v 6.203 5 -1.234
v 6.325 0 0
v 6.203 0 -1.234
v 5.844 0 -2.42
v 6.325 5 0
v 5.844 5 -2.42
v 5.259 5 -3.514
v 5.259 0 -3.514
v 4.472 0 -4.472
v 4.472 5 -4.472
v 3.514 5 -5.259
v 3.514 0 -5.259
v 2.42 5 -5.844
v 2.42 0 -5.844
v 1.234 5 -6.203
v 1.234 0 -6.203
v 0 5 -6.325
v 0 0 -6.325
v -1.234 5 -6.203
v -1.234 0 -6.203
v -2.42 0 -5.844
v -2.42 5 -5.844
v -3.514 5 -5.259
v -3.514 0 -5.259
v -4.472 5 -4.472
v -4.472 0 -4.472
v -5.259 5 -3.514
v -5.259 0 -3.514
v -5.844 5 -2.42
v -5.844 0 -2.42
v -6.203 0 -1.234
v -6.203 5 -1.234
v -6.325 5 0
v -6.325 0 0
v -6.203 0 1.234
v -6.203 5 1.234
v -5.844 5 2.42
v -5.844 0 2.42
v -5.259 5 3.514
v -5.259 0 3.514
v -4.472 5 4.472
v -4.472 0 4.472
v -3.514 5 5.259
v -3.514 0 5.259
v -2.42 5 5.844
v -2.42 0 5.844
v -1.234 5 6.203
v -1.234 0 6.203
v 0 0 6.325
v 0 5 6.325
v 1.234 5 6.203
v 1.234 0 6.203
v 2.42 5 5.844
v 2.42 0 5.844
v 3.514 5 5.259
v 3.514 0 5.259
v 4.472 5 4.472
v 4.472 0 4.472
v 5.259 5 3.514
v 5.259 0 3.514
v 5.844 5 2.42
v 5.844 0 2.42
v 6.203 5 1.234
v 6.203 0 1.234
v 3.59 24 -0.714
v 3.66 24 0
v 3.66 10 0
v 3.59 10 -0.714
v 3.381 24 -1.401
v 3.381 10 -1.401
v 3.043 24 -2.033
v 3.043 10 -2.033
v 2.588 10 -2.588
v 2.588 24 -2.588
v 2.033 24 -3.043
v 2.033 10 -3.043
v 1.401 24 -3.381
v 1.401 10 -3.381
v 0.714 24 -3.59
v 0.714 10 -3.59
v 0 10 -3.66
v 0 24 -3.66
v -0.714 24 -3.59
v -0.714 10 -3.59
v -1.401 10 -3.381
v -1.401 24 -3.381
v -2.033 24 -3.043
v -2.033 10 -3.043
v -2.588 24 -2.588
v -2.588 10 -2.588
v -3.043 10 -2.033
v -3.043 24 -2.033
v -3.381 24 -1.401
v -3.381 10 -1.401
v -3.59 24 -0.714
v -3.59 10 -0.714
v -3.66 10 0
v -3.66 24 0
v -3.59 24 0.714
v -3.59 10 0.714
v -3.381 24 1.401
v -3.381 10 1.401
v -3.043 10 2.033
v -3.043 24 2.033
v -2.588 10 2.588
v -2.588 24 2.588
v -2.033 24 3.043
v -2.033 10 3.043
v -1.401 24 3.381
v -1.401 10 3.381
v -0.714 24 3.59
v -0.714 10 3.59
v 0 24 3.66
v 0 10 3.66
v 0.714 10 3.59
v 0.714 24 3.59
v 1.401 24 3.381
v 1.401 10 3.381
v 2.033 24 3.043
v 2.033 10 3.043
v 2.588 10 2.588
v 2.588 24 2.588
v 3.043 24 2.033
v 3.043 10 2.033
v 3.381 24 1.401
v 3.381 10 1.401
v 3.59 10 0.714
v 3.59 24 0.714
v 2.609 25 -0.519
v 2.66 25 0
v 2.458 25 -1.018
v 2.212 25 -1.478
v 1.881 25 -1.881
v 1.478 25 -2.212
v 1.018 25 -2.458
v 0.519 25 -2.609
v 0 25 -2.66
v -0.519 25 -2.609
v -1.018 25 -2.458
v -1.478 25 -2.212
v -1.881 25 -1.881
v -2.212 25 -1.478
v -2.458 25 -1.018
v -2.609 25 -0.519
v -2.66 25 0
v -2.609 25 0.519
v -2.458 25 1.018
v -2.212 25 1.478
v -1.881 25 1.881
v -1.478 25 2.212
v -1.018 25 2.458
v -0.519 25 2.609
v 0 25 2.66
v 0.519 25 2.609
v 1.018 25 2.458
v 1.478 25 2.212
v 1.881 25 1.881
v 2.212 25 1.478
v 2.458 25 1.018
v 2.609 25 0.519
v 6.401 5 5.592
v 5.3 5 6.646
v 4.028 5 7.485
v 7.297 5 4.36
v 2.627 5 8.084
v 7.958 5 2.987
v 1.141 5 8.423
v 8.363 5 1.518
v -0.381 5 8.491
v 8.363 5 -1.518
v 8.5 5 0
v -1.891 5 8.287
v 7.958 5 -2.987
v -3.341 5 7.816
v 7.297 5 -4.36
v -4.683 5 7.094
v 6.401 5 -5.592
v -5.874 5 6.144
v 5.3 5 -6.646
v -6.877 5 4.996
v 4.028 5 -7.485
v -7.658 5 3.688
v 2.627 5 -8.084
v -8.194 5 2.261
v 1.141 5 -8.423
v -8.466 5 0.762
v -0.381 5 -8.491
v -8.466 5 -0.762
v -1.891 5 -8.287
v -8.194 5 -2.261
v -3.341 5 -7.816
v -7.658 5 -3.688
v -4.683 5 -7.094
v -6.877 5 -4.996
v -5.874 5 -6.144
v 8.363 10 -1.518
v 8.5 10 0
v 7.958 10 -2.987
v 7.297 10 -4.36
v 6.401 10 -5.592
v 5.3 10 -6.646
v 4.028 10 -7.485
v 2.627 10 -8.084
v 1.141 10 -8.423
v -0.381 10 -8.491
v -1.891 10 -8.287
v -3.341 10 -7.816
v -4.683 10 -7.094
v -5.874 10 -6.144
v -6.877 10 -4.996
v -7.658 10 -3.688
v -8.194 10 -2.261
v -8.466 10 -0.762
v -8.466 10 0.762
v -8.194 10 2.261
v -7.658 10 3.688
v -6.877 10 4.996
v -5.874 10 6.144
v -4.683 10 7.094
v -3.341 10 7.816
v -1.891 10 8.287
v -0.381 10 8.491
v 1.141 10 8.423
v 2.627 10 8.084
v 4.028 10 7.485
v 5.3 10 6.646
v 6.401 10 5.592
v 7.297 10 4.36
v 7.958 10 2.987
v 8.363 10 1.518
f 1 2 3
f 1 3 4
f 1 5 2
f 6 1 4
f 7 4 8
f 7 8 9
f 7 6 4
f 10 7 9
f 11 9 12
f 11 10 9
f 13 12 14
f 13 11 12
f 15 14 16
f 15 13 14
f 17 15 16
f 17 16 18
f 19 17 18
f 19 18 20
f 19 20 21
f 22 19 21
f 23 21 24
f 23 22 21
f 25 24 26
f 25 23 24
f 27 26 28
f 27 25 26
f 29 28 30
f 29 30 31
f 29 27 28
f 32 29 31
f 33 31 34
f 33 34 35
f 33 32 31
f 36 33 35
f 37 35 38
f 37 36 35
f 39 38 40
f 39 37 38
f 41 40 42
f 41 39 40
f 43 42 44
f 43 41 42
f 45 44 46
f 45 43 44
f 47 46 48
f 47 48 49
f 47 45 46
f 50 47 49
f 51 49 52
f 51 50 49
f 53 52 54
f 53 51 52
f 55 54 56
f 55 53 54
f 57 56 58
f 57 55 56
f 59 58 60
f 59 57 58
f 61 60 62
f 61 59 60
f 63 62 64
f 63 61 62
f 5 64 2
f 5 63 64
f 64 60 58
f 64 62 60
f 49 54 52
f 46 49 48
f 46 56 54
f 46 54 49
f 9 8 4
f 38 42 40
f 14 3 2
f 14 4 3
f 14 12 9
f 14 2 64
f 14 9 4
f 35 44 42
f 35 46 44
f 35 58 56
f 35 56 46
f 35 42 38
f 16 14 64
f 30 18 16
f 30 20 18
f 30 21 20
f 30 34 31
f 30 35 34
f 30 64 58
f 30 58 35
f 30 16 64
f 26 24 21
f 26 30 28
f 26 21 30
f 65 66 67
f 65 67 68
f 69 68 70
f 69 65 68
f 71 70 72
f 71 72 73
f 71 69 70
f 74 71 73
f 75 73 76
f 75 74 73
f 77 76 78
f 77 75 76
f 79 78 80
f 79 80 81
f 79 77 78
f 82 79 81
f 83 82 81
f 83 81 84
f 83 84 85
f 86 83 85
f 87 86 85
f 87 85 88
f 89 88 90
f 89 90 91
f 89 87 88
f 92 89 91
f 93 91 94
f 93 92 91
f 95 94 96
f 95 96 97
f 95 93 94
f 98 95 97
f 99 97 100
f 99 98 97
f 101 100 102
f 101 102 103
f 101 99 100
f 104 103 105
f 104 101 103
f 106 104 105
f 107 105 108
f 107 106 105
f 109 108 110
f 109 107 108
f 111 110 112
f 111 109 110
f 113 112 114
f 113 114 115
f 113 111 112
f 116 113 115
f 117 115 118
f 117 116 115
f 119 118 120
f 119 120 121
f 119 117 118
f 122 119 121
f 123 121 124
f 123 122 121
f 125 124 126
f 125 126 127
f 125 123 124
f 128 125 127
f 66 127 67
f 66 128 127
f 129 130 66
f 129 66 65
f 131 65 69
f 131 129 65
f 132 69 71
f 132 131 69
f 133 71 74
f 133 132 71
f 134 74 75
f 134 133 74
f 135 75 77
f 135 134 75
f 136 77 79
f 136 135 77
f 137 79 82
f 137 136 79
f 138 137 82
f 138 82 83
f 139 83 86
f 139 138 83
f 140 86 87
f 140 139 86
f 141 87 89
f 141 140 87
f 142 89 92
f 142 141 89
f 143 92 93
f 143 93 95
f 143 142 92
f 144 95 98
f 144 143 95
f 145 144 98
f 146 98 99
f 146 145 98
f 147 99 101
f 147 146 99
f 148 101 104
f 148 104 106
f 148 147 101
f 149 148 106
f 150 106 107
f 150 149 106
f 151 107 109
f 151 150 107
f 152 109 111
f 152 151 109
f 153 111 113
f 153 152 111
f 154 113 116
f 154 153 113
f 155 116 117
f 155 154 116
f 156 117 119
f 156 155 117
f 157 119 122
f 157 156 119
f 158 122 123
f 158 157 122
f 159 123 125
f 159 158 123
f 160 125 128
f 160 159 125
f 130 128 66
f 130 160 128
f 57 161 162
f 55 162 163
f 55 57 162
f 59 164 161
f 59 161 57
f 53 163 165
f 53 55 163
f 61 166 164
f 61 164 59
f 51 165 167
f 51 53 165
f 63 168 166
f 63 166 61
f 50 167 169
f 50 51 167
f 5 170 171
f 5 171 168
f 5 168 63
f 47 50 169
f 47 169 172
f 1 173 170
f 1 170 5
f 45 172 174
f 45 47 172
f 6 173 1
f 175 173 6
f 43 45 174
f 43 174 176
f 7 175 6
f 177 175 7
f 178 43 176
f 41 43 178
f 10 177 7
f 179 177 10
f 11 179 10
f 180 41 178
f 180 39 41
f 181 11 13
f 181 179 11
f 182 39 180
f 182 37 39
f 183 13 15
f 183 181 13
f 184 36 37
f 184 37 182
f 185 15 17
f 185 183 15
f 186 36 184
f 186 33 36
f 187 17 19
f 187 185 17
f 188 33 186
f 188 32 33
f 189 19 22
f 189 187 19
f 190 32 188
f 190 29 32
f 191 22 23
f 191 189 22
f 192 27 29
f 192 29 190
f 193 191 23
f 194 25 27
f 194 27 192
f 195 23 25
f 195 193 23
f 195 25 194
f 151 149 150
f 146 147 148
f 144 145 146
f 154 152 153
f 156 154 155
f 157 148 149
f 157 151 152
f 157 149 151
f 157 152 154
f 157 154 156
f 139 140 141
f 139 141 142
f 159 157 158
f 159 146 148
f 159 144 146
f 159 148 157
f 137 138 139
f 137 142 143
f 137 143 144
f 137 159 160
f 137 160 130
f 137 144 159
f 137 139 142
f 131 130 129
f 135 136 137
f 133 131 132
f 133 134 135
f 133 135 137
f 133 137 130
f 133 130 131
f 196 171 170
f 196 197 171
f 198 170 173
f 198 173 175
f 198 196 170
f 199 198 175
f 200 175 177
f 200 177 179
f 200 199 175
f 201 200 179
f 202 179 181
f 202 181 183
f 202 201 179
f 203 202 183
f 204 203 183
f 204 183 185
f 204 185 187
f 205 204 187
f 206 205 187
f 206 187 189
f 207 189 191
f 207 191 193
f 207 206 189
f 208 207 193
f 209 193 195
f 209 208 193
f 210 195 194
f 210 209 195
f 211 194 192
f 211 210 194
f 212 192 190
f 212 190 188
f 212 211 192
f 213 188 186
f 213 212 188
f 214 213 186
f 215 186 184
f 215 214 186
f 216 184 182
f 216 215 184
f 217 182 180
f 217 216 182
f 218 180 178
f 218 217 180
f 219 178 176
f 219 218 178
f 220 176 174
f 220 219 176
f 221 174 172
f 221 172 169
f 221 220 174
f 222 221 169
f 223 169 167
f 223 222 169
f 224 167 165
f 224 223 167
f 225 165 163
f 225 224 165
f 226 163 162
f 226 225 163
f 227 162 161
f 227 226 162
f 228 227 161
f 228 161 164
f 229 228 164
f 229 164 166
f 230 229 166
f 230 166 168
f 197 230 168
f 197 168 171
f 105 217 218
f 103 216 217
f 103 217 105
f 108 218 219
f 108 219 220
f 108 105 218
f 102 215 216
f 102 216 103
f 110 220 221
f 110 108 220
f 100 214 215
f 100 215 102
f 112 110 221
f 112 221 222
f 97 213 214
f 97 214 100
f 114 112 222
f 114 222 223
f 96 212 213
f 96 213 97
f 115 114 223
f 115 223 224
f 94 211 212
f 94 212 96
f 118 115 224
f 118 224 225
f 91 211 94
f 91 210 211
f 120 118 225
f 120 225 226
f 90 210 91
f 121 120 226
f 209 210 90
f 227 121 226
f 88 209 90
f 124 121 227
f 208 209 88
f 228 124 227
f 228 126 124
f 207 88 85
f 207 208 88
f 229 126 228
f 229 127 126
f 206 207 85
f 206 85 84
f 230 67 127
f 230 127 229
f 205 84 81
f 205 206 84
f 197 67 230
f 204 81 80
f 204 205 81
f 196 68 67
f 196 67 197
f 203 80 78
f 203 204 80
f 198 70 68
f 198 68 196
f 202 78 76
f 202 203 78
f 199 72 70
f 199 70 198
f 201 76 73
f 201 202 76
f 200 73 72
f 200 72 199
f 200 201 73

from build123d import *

# Parameters (mm, degrees)
CHAMFER_1_SIZE = 1


with BuildPart() as part:
    # 草图1 → 旋转1 (revolve)
    with BuildSketch(Plane.XY):
        Polygon((0, 0), (6.325, 0), (6.325, 5), (8.5, 5), (8.5, 10), (3.66, 10), (3.66, 25), (0, 25), align=None)
    revolve(axis=Axis((0, 25, 0), (0, 1, 0)))

    # 倒角1
    chamfer_1_edges = [part.edges().sort_by_distance(p)[0] for p in [
        (-3.66, 25, 0),
    ]]
    chamfer(chamfer_1_edges, length=CHAMFER_1_SIZE)


solid = part.part
